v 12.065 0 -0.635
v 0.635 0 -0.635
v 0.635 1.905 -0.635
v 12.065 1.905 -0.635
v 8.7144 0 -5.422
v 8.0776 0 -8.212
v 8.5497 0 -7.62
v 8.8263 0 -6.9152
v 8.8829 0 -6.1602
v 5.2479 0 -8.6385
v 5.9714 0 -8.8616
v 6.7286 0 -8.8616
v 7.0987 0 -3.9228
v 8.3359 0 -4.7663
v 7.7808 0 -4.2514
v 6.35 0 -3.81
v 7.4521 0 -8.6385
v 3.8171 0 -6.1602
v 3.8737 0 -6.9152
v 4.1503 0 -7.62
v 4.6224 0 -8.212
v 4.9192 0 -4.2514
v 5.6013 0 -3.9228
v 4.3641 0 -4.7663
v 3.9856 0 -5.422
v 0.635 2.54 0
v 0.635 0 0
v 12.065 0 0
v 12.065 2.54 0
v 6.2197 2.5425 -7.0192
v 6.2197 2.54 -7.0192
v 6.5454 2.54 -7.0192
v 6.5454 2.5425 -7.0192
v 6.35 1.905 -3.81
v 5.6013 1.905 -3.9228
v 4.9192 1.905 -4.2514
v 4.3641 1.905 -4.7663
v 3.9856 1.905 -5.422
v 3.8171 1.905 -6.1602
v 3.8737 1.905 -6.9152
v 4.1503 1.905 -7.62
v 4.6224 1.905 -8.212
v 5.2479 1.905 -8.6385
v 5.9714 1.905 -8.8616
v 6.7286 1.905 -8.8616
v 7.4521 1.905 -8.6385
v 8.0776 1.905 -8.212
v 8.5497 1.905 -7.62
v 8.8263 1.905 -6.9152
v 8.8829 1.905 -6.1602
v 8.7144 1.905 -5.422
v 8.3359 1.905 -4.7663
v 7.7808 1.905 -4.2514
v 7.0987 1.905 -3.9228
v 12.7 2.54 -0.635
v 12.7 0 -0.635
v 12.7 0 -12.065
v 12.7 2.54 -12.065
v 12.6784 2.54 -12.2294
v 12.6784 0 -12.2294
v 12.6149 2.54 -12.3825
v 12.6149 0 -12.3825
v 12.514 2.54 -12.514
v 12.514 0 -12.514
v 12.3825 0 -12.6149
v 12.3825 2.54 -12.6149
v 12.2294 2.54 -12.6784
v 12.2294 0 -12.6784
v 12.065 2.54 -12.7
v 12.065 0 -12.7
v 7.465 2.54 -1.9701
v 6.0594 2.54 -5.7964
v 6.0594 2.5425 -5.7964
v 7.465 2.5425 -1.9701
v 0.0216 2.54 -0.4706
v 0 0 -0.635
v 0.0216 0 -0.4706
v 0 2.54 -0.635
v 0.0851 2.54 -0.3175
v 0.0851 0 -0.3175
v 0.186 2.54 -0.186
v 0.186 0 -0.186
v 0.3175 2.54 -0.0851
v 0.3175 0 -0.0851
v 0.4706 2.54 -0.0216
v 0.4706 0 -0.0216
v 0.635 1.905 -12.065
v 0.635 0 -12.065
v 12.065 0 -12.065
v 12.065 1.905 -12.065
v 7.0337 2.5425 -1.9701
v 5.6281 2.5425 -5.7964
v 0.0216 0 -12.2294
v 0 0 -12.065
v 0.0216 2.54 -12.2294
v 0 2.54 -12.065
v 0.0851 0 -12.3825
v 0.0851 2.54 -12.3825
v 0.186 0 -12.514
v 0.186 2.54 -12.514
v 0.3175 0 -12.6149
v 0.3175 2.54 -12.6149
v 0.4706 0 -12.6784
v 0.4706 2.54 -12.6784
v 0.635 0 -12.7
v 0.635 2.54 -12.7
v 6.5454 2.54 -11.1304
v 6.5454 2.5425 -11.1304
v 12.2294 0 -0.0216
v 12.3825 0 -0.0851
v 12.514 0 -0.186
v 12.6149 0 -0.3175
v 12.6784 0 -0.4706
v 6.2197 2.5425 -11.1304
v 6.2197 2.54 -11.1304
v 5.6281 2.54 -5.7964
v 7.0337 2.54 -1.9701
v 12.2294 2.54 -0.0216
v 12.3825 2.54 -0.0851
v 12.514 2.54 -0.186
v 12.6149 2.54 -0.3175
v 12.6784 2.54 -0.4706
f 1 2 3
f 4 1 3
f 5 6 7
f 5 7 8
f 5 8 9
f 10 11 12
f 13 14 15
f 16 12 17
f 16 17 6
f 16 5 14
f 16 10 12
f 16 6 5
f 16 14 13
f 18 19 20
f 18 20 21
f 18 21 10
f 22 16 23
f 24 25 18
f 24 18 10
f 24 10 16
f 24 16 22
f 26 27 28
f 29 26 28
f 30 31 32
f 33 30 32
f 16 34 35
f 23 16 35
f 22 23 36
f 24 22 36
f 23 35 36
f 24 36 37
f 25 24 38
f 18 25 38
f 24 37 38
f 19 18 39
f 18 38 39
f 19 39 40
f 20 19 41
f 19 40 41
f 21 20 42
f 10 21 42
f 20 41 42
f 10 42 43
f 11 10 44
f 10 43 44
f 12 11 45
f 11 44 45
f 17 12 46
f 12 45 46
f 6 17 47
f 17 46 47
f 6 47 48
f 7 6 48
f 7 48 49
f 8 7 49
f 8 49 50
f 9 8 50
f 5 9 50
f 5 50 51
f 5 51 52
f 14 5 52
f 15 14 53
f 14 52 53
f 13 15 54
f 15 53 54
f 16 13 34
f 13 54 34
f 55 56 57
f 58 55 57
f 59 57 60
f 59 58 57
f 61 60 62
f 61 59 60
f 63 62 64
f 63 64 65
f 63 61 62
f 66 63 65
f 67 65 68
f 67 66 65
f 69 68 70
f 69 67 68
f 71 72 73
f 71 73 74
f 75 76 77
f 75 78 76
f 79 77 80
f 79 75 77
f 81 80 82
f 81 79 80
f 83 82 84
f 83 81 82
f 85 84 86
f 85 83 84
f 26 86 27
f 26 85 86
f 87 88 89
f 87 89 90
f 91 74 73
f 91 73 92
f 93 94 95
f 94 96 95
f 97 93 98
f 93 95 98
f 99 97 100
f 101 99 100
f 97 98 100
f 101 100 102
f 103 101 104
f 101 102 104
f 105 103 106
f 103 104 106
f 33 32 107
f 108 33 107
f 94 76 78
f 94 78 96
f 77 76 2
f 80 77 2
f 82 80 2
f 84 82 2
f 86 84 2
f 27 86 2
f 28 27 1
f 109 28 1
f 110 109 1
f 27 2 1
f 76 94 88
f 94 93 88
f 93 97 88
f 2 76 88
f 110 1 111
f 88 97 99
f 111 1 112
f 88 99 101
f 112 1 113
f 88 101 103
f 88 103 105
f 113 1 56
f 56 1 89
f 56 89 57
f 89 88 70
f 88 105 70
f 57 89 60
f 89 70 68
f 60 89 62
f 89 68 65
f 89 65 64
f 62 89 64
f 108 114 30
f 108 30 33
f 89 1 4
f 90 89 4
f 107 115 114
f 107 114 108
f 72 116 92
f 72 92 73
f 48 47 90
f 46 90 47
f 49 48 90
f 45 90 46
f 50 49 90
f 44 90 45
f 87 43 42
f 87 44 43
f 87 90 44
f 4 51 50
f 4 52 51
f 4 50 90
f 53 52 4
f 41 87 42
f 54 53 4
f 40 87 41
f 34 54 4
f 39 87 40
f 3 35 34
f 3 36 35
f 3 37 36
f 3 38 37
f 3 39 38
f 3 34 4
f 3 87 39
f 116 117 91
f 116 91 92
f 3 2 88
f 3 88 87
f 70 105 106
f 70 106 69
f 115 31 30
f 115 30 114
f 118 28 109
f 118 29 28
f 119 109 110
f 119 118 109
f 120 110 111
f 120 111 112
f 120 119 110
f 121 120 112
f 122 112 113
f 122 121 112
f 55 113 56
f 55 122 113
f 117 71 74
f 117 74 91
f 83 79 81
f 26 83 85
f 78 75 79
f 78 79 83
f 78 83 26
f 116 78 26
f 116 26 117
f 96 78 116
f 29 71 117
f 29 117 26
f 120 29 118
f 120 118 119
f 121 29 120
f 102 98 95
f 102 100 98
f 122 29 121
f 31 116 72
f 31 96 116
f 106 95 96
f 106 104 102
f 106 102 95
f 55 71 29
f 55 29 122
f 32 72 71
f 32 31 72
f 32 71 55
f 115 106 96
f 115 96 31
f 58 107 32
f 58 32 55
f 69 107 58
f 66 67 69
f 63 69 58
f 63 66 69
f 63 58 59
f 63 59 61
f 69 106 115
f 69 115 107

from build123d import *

# Parameters (mm, degrees)
SKETCH1_W           = 12.7
SKETCH1_H           = 12.7
BOSS_EXTRUDE1_DEPTH = 2.54
FILLET1_R           = 0.635
SHELL1_START        = 0.635
SHELL1_OUTLINE_W    = 1.905
SHELL1_OUTLINE_H    = 11.43
SHELL1_DEPTH        = 11.43
SKETCH2_R           = 2.54
BOSS_EXTRUDE2_DEPTH = 1.905
SKETCH4_W           = 0.325641025
SKETCH4_H           = 4.111217948
BOSS_EXTRUDE4_DEPTH = 0.00254


# Read off the part's stored shape, not the designer's step: Shell1
with BuildPart() as part:
    # Sketch1 → Boss-Extrude1 (new body)
    with BuildSketch(Plane(origin=(0, 0, 0), x_dir=(1, 0, 0), z_dir=(0, 1, 0))):
        with Locations((6.35, 6.35)):
            Rectangle(SKETCH1_W, SKETCH1_H)
    extrude(amount=BOSS_EXTRUDE1_DEPTH)

    # Fillet1
    fillet1_edges = [part.edges().sort_by_distance(p)[0] for p in [
        (0, 1.27, -12.7),
        (12.7, 1.27, -12.7),
        (12.7, 1.27, 0),
        (0, 1.27, 0),
    ]]
    fillet(fillet1_edges, radius=FILLET1_R)

    # Shell1 outline → Shell1 (cut)
    with BuildSketch(Plane.YZ.offset(SHELL1_START)):
        with Locations((0.9525, -6.35)):
            Rectangle(SHELL1_OUTLINE_W, SHELL1_OUTLINE_H)
    extrude(amount=SHELL1_DEPTH, mode=Mode.SUBTRACT)

    # Sketch2 → Boss-Extrude2 (add)
    with BuildSketch(Plane(origin=(0, 1.905, 0), x_dir=(-1, 0, 0), z_dir=(0, -1, 0))):
        with Locations(Location((-6.35, 6.35, 0), (0, 0, 270))):
            Circle(SKETCH2_R)
    extrude(amount=BOSS_EXTRUDE2_DEPTH)

    # Sketch4 → Boss-Extrude4 (add)
    with BuildSketch(Plane(origin=(0, 2.54, 0), x_dir=(1, 0, 0), z_dir=(0, 1, 0))):
        Polygon((7.464964343, 1.970128205), (7.033744391, 1.970128205), (5.628145433, 5.796410256), (6.059365385, 5.796410256), align=None)
        with Locations((6.382564102, 9.074801282)):
            Rectangle(SKETCH4_W, SKETCH4_H)
    extrude(amount=BOSS_EXTRUDE4_DEPTH)


solid = part.part
